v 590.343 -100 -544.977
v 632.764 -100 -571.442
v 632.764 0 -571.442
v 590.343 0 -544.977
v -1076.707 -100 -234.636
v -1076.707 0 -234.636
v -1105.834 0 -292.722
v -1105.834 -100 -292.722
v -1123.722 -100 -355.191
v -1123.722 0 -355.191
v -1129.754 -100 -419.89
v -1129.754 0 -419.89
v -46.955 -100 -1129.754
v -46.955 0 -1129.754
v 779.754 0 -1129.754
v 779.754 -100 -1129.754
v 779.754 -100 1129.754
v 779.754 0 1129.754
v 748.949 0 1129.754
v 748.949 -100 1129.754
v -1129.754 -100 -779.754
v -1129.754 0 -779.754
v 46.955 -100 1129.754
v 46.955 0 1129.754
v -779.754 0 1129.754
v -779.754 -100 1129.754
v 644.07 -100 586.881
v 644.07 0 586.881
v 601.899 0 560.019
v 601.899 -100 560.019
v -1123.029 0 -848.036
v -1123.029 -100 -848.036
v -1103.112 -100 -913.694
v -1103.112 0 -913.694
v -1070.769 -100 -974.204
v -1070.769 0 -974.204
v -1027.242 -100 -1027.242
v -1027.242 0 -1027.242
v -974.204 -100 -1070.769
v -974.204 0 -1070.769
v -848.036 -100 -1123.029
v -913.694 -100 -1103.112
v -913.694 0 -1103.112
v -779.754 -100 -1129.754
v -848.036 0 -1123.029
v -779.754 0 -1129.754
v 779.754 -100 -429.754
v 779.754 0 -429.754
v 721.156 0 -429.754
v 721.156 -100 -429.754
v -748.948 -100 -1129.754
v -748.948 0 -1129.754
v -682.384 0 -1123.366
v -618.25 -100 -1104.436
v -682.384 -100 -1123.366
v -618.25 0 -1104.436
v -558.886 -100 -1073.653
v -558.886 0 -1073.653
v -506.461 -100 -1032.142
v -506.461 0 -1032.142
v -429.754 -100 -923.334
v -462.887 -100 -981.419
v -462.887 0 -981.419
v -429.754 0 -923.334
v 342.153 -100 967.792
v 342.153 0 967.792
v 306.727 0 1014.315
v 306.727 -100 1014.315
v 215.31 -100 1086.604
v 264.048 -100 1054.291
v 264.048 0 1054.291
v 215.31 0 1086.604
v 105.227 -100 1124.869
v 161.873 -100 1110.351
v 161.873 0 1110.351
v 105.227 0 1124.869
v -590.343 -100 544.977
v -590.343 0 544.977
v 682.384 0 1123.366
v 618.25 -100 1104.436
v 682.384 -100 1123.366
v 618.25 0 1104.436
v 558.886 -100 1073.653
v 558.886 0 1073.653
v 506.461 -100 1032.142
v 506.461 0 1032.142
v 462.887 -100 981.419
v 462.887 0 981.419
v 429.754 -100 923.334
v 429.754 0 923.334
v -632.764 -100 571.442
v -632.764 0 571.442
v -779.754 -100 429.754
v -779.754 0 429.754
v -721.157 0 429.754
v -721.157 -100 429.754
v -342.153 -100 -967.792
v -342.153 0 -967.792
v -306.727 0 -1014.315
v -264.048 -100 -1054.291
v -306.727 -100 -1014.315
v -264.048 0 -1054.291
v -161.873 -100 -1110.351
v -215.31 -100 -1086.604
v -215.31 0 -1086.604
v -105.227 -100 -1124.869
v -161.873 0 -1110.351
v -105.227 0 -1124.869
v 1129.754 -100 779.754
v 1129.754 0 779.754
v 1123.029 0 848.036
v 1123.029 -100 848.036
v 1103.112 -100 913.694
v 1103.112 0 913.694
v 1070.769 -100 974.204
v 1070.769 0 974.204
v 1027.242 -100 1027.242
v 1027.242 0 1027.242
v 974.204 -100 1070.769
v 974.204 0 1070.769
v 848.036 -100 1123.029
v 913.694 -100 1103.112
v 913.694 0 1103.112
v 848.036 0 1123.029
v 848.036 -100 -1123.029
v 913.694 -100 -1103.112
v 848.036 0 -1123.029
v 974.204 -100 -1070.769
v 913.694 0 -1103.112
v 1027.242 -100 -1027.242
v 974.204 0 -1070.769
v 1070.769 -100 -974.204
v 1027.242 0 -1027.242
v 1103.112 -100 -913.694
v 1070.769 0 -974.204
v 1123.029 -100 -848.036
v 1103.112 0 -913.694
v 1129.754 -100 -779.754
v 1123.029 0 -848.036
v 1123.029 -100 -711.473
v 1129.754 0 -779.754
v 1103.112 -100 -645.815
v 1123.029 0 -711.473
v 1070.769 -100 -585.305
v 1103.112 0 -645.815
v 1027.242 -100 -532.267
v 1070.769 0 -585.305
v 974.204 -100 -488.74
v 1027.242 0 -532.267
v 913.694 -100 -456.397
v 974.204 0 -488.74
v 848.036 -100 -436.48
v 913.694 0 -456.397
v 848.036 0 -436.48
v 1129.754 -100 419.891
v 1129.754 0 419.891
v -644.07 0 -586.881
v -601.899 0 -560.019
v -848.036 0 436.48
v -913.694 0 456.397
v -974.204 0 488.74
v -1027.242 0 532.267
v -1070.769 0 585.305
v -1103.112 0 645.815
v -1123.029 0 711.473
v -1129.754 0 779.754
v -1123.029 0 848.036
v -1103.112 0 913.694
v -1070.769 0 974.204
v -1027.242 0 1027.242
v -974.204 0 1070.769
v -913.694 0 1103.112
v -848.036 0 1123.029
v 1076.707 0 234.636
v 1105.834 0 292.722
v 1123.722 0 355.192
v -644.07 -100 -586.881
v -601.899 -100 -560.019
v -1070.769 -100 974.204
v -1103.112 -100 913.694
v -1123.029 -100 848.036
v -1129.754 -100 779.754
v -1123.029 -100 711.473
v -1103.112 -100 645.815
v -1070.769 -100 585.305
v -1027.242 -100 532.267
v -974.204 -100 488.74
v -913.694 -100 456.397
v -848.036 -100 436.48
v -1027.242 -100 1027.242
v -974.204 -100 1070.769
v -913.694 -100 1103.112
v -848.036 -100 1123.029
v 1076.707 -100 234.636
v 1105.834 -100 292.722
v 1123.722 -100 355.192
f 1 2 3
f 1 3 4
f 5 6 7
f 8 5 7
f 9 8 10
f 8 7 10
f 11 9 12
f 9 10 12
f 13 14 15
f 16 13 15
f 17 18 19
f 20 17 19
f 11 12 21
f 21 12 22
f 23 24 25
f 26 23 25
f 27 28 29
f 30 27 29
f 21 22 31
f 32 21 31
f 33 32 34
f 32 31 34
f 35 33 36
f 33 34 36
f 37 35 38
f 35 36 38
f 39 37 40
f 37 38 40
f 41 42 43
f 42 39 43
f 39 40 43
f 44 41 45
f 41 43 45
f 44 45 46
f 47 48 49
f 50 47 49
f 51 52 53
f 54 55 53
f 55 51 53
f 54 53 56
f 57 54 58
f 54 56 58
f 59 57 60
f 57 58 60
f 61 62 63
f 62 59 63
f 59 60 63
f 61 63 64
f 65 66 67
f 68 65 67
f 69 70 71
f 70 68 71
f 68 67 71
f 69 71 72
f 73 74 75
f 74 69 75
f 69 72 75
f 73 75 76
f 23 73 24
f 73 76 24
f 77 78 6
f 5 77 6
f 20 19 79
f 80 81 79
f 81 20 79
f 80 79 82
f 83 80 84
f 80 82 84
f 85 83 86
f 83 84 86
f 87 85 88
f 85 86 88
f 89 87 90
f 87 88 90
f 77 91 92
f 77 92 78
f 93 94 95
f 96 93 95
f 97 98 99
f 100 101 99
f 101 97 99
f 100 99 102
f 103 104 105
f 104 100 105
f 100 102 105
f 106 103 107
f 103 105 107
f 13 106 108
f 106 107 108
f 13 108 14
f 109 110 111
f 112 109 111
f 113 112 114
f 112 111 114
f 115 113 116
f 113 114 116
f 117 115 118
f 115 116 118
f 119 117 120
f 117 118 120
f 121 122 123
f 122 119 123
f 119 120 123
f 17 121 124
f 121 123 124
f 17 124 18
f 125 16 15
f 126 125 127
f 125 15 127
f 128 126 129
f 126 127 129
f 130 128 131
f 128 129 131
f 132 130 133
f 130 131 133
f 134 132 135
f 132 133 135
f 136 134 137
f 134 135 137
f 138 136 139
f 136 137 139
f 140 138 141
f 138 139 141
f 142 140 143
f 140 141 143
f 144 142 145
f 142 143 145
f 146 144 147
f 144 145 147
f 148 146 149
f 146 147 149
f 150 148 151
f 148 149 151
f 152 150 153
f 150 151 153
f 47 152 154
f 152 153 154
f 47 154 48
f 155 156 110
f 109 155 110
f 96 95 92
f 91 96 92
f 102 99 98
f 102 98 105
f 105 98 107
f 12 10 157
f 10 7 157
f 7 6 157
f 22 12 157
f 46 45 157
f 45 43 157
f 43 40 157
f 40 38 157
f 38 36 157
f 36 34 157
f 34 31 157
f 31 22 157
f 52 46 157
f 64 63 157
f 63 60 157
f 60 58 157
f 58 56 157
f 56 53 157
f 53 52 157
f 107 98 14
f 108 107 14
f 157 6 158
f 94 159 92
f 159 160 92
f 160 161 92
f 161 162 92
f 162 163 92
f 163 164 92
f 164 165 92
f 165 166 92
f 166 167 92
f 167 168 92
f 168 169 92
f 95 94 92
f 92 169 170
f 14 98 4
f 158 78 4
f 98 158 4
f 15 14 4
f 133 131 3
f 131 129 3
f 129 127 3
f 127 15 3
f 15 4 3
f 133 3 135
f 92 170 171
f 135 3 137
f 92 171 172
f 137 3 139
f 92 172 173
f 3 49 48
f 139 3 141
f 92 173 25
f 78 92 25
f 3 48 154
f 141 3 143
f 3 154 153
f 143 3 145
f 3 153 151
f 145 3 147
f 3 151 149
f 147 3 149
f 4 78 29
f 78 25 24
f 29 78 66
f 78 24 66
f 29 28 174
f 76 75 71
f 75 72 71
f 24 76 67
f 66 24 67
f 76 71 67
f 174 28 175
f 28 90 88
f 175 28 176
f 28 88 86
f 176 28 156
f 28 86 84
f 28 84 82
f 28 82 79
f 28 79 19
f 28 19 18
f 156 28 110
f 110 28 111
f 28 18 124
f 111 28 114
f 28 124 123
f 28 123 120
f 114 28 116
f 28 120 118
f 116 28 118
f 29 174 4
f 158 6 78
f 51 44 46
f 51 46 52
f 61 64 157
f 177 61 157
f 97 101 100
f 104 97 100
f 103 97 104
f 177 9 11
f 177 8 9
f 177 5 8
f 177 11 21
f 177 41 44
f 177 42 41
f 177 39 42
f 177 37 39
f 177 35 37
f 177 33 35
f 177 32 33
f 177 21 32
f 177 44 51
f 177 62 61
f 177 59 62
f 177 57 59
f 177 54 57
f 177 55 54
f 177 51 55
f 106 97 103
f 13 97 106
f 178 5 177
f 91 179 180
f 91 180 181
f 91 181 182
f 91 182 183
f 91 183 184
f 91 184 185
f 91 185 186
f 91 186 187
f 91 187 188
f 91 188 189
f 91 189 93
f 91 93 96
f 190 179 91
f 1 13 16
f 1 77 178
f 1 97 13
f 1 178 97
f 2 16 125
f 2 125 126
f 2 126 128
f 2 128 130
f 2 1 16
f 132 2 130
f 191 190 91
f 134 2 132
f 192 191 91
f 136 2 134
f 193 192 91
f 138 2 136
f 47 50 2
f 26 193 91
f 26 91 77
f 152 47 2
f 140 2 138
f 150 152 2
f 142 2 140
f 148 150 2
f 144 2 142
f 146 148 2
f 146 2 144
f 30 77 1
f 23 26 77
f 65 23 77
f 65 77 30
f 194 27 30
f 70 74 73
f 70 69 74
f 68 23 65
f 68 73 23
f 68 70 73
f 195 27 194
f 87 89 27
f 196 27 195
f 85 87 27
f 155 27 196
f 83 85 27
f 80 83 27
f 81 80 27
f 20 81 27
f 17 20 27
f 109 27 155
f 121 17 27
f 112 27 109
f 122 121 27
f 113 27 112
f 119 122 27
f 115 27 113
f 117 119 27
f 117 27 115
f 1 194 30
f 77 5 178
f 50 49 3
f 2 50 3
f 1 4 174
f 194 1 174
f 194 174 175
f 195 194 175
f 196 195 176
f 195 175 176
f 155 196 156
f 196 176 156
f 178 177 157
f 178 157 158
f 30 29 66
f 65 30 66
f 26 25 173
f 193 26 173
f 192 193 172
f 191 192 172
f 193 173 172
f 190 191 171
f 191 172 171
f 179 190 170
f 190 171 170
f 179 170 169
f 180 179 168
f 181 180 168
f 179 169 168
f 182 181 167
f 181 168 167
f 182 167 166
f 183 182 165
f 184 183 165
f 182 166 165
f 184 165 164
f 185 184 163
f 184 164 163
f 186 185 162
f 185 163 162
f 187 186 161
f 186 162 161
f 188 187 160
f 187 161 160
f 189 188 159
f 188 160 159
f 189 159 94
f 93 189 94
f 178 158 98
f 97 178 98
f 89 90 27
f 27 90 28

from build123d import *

# Parameters (mm, degrees)
F1_DEPTH     = 100
F2_T1_DEPTH  = 1850
F2_T3_DEPTH  = 1695.9707417334
F2_T5_DEPTH  = 1695.9706144549
F2_T7_DEPTH  = 601.1121280065
F2_T9_DEPTH  = 1060.1512237757
F2_T11_DEPTH = 601.1120863274
F2_T13_DEPTH = 1060.1510758761


# Not quite as in the source:
# - a fillet or chamfer that OpenCascade refuses, or shapes differently, is made with other operations: its cross-section is extruded or revolved along the edge and cut away or added


with BuildPart() as f1:
    # F0 (on Front) → F1 (new body)
    with BuildSketch(Plane.XZ):
        Polygon((1129.7543572, 319.6687281531), (1129.7543572, 1129.7543953), (429.7543572, 1129.7543953), (429.7543572, 923.3339748412), (644.069888311, 586.8814977509), (601.898706638, 560.0190437248), (238.9852410529, 1129.7543953), (-1129.7543572, 1129.7543953), (-1129.7543572, 429.7543953), (-721.1567962335, 429.7543953), (-632.764270148, 571.4424256952), (-590.342503852, 544.9774725622), (-1129.7543572, -319.6680631783), (-1129.7543572, -1129.7543953), (-429.7543572, -1129.7543953), (-429.7543572, -923.3340314322), (-644.0698939815, -586.8814489736), (-601.8987088185, -560.0190004264), (-238.9853197059, -1129.7543953), (1129.7543572, -1129.7543953), (1129.7543572, -429.7543953), (721.156425601, -429.7543953), (632.7643072985, -571.4417859327), (590.3425398375, -544.9768346673), align=None)
    extrude(amount=F1_DEPTH)

    # F2: fillet of radius 350 on 12 edges, made by hand

    # F2_s2 → F2_t1 (cut)
    with BuildSketch(Plane.XZ.offset(-875)):
        with BuildLine():
            ThreePointArc((1129.7543572, 779.7543953), (1027.2417306153, 1027.2417687153), (779.7543572, 1129.7543953))
            Line((779.7543572, 1129.7543953), (1129.7543572, 1129.7543953))
            Line((1129.7543572, 1129.7543953), (1129.7543572, 779.7543953))
        make_face()
        with BuildLine():
            ThreePointArc((-779.7543572, 1129.7543953), (-1027.2417306153, 1027.2417687153), (-1129.7543572, 779.7543953))
            Line((-1129.7543572, 779.7543953), (-1129.7543572, 1129.7543953))
            Line((-1129.7543572, 1129.7543953), (-779.7543572, 1129.7543953))
        make_face()
        with BuildLine():
            ThreePointArc((-1129.7543572, 779.7543953), (-1027.2417306153, 532.2670218847), (-779.7543572, 429.7543953))
            Line((-779.7543572, 429.7543953), (-1129.7543572, 429.7543953))
            Line((-1129.7543572, 429.7543953), (-1129.7543572, 779.7543953))
        make_face()
        with BuildLine():
            ThreePointArc((-1129.7543572, -779.7543953), (-1027.2417306153, -1027.2417687153), (-779.7543572, -1129.7543953))
            Line((-779.7543572, -1129.7543953), (-1129.7543572, -1129.7543953))
            Line((-1129.7543572, -1129.7543953), (-1129.7543572, -779.7543953))
        make_face()
        with BuildLine():
            ThreePointArc((1129.7543572, -779.7543953), (1027.2417306153, -1027.2417687153), (779.7543572, -1129.7543953))
            Line((779.7543572, -1129.7543953), (1129.7543572, -1129.7543953))
            Line((1129.7543572, -1129.7543953), (1129.7543572, -779.7543953))
        make_face()
        with BuildLine():
            ThreePointArc((1129.7543572, -779.7543953), (1027.2417306153, -532.2670218847), (779.7543572, -429.7543953))
            Line((779.7543572, -429.7543953), (1129.7543572, -429.7543953))
            Line((1129.7543572, -429.7543953), (1129.7543572, -779.7543953))
        make_face()
    extrude(amount=F2_T1_DEPTH, mode=Mode.SUBTRACT)

    # F2_s4 → F2_t3 (cut)
    with BuildSketch(Plane.XZ.offset(-797.9853708667)):
        with BuildLine():
            ThreePointArc((748.9485055467, 1129.7543953), (558.8864799332, 1073.653062224), (429.7543572, 923.3339748412))
            Line((429.7543572, 923.3339748412), (429.7543572, 1129.7543953))
            Line((429.7543572, 1129.7543953), (748.9485055467, 1129.7543953))
        make_face()
    extrude(amount=F2_T3_DEPTH, mode=Mode.SUBTRACT)

    # F2_s6 → F2_t5 (cut)
    with BuildSketch(Plane.XZ.offset(-797.9853072275)):
        with BuildLine():
            ThreePointArc((-748.948480091, -1129.7543953), (-558.8864805307, -1073.6530790724), (-429.7543572, -923.3340314322))
            Line((-429.7543572, -923.3340314322), (-429.7543572, -1129.7543953))
            Line((-429.7543572, -1129.7543953), (-748.948480091, -1129.7543953))
        make_face()
    extrude(amount=F2_T5_DEPTH, mode=Mode.SUBTRACT)

    # F2_s8 → F2_t7 (cut)
    with BuildSketch(Plane.XZ.offset(-250.5560640033)):
        with BuildLine():
            ThreePointArc((-1076.7067212718, -234.6358168488), (-1116.2311969863, -323.5404172309), (-1129.7543572, -419.8904887796))
            Line((-1129.7543572, -419.8904887796), (-1129.7543572, -319.6680631783))
            Line((-1129.7543572, -319.6680631783), (-1076.7067212718, -234.6358168488))
        make_face()
    extrude(amount=F2_T7_DEPTH, mode=Mode.SUBTRACT)

    # F2_s10 → F2_t9 (cut)
    with BuildSketch(Plane.XZ.offset(-480.0756118878)):
        with BuildLine():
            ThreePointArc((-342.1533710911, -967.7915351311), (-215.310355621, -1086.6037059892), (-46.9550749508, -1129.7543953))
            Line((-46.9550749508, -1129.7543953), (-238.9853197059, -1129.7543953))
            Line((-238.9853197059, -1129.7543953), (-342.1533710911, -967.7915351311))
        make_face()
    extrude(amount=F2_T9_DEPTH, mode=Mode.SUBTRACT)

    # F2_s12 → F2_t11 (cut)
    with BuildSketch(Plane.XZ.offset(-250.5560431637)):
        with BuildLine():
            ThreePointArc((1076.7067294274, 234.6364865607), (1116.2311991071, 323.5410812763), (1129.7543572, 419.8911454186))
            Line((1129.7543572, 419.8911454186), (1129.7543572, 319.6687281531))
            Line((1129.7543572, 319.6687281531), (1076.7067294274, 234.6364865607))
        make_face()
    extrude(amount=F2_T11_DEPTH, mode=Mode.SUBTRACT)

    # F2_s14 → F2_t13 (cut)
    with BuildSketch(Plane.XZ.offset(-480.0755379381)):
        with BuildLine():
            ThreePointArc((342.1532975884, 967.791573483), (215.3102866151, 1086.6037169255), (46.9550258777, 1129.7543953))
            Line((46.9550258777, 1129.7543953), (238.9852410529, 1129.7543953))
            Line((238.9852410529, 1129.7543953), (342.1532975884, 967.791573483))
        make_face()
    extrude(amount=F2_T13_DEPTH, mode=Mode.SUBTRACT)


solid = f1.part
